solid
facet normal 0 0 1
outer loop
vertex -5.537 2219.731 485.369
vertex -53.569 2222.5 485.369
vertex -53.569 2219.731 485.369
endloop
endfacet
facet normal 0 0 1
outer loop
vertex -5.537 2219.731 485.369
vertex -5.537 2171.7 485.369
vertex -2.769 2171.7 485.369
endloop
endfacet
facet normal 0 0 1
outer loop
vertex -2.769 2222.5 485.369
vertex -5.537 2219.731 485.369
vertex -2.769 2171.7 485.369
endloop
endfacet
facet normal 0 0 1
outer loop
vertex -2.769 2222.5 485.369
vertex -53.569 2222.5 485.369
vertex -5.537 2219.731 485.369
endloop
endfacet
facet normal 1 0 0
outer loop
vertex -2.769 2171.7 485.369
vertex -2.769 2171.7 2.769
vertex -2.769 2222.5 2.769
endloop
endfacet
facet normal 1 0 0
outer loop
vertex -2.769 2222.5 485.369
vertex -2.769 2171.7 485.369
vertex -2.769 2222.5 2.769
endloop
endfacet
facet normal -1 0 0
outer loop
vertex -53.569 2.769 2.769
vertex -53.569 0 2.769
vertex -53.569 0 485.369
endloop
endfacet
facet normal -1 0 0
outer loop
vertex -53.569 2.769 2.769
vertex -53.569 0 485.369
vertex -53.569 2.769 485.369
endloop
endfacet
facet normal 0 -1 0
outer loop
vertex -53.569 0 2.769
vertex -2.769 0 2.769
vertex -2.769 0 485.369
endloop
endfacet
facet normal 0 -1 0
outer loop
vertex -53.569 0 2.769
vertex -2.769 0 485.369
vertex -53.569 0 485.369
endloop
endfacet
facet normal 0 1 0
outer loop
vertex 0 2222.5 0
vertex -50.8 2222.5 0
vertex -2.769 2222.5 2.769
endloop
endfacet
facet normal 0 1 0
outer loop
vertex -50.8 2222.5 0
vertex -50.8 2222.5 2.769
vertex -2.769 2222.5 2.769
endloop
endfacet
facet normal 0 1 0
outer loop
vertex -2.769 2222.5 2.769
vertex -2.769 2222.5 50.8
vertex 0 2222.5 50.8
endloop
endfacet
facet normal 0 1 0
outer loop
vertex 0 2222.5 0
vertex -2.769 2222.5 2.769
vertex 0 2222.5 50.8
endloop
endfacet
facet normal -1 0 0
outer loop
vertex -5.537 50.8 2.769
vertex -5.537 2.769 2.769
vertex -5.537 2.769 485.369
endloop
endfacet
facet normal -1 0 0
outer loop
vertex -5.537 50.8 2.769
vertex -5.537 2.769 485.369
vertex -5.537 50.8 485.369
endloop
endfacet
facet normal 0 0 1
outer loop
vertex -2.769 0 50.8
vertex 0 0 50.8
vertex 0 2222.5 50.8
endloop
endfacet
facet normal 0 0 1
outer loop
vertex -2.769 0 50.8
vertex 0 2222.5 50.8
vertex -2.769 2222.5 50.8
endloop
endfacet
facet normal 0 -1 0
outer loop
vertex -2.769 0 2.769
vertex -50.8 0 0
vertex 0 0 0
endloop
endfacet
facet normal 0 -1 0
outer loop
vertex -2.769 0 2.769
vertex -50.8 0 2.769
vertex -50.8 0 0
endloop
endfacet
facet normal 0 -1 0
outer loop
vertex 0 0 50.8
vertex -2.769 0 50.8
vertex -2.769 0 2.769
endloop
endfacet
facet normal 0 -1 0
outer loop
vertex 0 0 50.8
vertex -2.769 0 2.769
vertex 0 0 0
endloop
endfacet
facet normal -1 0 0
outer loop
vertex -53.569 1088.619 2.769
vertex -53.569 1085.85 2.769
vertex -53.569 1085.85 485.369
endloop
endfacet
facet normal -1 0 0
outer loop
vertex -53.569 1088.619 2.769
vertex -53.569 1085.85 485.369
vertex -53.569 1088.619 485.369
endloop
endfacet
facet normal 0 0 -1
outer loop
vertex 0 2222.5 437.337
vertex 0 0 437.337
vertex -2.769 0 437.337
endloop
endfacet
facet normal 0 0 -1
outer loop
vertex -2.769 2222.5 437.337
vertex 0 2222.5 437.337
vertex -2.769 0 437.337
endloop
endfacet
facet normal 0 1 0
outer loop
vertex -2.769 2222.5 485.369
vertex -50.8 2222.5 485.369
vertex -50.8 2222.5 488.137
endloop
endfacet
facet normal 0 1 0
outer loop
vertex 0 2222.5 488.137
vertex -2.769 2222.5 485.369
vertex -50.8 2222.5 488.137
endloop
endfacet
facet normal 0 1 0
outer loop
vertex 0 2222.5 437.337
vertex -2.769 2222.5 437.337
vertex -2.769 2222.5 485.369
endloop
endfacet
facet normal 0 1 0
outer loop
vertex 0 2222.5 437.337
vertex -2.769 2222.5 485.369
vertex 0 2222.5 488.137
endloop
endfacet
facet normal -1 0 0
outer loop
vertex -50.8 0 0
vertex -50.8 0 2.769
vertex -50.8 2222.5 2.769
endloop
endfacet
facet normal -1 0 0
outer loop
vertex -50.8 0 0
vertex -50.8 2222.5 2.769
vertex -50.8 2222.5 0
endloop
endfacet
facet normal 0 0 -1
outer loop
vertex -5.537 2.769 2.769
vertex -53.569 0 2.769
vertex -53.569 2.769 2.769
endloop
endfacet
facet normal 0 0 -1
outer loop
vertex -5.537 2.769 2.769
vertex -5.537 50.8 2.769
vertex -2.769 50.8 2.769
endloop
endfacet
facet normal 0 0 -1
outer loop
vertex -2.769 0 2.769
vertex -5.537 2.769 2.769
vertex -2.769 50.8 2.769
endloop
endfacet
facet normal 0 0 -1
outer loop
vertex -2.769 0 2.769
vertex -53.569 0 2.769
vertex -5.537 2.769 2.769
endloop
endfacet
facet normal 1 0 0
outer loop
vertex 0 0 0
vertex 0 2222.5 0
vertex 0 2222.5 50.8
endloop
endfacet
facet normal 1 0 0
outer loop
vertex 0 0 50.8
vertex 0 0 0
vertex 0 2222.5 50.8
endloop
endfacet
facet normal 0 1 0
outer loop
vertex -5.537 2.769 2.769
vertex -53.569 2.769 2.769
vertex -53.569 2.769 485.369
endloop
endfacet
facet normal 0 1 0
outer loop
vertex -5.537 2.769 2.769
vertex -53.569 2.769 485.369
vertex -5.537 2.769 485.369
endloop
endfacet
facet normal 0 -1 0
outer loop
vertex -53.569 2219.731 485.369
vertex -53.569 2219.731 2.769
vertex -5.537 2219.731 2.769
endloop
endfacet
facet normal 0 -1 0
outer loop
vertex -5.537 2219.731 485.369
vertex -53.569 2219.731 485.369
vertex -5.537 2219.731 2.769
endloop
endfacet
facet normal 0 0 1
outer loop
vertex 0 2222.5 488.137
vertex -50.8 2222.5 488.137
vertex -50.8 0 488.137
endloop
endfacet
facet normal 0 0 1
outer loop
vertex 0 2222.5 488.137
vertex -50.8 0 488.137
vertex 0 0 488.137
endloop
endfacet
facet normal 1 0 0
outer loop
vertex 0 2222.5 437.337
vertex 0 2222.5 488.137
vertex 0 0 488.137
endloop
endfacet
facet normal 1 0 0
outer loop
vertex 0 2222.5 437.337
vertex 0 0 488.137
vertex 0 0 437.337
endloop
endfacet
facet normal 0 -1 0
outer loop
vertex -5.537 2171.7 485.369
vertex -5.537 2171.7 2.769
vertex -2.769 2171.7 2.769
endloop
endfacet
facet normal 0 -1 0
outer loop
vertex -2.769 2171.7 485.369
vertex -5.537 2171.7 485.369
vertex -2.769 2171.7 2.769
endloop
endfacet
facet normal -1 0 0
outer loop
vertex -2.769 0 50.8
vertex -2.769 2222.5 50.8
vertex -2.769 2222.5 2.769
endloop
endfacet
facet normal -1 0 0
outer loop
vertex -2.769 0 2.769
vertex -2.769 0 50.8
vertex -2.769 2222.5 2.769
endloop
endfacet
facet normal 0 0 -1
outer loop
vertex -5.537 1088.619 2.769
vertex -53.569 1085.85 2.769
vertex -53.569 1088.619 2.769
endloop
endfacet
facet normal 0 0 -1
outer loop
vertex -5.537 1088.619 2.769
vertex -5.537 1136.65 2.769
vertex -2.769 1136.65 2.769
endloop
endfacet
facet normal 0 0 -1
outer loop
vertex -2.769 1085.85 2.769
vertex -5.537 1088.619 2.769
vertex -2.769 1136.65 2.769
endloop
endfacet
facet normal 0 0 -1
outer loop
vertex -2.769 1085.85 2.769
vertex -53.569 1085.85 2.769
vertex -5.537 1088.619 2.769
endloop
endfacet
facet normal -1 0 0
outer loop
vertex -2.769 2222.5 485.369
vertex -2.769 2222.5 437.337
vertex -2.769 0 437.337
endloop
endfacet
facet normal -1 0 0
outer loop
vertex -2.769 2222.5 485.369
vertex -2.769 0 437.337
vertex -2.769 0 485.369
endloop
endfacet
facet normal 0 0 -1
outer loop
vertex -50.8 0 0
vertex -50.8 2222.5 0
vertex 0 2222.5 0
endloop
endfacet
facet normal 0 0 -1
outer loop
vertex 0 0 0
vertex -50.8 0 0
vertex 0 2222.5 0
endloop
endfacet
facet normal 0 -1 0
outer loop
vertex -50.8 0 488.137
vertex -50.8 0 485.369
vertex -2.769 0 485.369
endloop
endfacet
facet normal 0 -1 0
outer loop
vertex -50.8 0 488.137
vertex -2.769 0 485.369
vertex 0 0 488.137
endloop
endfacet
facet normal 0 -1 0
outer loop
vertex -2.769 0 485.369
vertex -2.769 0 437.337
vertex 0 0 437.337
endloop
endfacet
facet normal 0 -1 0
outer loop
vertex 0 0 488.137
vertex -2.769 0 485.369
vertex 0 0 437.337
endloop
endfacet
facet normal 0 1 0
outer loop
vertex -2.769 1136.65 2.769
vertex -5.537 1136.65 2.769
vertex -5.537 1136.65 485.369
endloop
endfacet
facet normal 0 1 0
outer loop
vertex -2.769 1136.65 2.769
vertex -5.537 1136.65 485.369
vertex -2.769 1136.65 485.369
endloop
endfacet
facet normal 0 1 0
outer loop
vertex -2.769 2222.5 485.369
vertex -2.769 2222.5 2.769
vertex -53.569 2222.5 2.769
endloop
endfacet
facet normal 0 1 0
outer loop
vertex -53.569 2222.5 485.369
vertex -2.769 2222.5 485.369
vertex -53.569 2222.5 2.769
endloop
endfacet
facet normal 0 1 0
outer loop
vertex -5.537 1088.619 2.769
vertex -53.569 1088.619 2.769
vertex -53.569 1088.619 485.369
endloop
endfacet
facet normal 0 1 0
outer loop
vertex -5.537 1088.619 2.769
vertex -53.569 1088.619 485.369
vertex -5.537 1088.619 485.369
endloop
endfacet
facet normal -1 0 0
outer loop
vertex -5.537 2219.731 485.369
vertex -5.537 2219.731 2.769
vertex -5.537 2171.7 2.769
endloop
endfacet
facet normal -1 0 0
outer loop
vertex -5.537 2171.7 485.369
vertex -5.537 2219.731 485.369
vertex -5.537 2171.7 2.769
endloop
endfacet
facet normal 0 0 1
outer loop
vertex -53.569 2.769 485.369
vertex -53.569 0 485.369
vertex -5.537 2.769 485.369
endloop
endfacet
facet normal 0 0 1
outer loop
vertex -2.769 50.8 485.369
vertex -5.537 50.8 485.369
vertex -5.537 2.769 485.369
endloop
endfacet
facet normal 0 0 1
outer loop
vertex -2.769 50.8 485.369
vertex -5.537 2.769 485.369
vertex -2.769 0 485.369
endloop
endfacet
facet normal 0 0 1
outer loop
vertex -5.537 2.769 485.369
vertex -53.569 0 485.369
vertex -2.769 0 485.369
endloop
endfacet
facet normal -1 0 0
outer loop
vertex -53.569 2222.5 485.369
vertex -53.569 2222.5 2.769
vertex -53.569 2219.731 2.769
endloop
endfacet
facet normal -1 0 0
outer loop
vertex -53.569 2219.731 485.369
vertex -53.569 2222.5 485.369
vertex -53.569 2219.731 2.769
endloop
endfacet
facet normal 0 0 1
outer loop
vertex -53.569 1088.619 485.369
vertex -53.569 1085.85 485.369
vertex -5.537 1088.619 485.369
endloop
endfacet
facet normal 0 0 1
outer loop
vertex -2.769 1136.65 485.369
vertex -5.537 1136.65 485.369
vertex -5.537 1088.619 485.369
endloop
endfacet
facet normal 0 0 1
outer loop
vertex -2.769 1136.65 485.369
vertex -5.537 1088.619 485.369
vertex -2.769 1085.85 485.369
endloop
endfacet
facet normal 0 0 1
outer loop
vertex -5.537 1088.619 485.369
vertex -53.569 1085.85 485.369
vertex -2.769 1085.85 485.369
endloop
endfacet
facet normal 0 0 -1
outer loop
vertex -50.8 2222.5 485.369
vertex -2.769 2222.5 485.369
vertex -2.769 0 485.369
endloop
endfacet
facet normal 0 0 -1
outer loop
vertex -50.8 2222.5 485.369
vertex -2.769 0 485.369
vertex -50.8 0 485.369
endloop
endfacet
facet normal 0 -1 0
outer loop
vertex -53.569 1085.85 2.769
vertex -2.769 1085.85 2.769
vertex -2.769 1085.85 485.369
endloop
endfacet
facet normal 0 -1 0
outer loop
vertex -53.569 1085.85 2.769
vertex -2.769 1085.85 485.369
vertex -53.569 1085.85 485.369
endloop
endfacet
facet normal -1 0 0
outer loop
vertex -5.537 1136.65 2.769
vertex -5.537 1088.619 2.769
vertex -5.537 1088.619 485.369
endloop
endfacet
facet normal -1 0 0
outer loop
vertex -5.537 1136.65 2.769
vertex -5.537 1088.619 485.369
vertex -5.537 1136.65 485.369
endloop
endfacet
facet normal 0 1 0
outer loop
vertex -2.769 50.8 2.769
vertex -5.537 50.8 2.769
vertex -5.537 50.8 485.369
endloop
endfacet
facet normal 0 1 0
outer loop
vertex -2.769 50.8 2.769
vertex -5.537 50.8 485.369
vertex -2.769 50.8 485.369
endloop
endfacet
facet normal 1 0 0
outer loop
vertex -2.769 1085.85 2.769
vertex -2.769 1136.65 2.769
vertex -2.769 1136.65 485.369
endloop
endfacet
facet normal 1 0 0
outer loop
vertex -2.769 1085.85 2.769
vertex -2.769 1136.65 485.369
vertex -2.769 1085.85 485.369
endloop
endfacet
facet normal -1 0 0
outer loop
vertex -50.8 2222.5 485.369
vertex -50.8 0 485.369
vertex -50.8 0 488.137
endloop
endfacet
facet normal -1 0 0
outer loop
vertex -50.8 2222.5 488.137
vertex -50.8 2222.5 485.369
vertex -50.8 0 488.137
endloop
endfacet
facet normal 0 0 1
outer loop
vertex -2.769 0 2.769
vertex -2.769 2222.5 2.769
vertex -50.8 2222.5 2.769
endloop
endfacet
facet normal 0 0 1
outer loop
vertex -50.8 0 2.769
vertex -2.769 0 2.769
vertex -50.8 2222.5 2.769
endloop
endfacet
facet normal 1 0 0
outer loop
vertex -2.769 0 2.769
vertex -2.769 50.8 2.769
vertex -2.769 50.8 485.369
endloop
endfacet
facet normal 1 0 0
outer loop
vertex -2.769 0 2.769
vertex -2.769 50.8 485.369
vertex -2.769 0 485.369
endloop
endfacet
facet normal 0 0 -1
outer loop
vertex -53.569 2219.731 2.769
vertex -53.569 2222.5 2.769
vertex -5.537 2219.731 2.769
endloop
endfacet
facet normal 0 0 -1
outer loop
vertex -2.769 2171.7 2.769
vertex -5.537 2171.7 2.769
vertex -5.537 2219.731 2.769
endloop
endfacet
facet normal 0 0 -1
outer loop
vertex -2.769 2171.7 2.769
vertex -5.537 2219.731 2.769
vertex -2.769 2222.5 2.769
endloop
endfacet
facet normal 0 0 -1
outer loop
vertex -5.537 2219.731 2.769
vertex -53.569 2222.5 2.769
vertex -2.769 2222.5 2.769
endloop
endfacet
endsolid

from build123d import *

# Parameters (mm, degrees)
F1_DEPTH = 2222.5
F3_DEPTH = 482.6


# Not quite as in the source:
# - a feature of the source that left no trace in its solid (it failed there, or was rolled back) is left out
# - a pattern or mirror of a feature is missing from the dataset's text; its kind, count and spacing are read off the source's solid


with BuildPart() as f1:
    # F0 (on Front) → F1 (new body)
    with BuildSketch(Plane.XZ):
        Polygon((-50.8, 0), (0, 0), (0, 50.8), (-2.7686, 50.8), (-2.7686, 2.7686), (-50.8, 2.7686), align=None)
    extrude(amount=-F1_DEPTH)


with BuildPart() as f3:
    # F2 (on face) → F3 (new body)
    with BuildSketch(Plane.XY.offset(2.7686)):
        Polygon((-2.7686, 2171.7), (-2.7686, 2222.5), (-53.5686, 2222.5), (-53.5686, 2219.7314), (-5.5372, 2219.7314), (-5.5372, 2171.7), align=None)
    extrude(amount=F3_DEPTH)


with BuildPart() as f3_copies_1:
    # F3_copies: instance of F3
    add(f3.part.mirror(Plane(origin=(0, 1654.175, 0), x_dir=(0, 0, -1), z_dir=(0, -1, 0))))


with BuildPart() as f5_1:
    # F5: instance of F3
    add(f3.part.mirror(Plane.XZ.offset(-1111.25)))


with BuildPart() as f7_1:
    # F7: instance of F1
    add(f1.part.mirror(Plane.XY.offset(244.0686)))


solid = Compound([f1.part, f3.part, f3_copies_1.part, f5_1.part, f7_1.part])
